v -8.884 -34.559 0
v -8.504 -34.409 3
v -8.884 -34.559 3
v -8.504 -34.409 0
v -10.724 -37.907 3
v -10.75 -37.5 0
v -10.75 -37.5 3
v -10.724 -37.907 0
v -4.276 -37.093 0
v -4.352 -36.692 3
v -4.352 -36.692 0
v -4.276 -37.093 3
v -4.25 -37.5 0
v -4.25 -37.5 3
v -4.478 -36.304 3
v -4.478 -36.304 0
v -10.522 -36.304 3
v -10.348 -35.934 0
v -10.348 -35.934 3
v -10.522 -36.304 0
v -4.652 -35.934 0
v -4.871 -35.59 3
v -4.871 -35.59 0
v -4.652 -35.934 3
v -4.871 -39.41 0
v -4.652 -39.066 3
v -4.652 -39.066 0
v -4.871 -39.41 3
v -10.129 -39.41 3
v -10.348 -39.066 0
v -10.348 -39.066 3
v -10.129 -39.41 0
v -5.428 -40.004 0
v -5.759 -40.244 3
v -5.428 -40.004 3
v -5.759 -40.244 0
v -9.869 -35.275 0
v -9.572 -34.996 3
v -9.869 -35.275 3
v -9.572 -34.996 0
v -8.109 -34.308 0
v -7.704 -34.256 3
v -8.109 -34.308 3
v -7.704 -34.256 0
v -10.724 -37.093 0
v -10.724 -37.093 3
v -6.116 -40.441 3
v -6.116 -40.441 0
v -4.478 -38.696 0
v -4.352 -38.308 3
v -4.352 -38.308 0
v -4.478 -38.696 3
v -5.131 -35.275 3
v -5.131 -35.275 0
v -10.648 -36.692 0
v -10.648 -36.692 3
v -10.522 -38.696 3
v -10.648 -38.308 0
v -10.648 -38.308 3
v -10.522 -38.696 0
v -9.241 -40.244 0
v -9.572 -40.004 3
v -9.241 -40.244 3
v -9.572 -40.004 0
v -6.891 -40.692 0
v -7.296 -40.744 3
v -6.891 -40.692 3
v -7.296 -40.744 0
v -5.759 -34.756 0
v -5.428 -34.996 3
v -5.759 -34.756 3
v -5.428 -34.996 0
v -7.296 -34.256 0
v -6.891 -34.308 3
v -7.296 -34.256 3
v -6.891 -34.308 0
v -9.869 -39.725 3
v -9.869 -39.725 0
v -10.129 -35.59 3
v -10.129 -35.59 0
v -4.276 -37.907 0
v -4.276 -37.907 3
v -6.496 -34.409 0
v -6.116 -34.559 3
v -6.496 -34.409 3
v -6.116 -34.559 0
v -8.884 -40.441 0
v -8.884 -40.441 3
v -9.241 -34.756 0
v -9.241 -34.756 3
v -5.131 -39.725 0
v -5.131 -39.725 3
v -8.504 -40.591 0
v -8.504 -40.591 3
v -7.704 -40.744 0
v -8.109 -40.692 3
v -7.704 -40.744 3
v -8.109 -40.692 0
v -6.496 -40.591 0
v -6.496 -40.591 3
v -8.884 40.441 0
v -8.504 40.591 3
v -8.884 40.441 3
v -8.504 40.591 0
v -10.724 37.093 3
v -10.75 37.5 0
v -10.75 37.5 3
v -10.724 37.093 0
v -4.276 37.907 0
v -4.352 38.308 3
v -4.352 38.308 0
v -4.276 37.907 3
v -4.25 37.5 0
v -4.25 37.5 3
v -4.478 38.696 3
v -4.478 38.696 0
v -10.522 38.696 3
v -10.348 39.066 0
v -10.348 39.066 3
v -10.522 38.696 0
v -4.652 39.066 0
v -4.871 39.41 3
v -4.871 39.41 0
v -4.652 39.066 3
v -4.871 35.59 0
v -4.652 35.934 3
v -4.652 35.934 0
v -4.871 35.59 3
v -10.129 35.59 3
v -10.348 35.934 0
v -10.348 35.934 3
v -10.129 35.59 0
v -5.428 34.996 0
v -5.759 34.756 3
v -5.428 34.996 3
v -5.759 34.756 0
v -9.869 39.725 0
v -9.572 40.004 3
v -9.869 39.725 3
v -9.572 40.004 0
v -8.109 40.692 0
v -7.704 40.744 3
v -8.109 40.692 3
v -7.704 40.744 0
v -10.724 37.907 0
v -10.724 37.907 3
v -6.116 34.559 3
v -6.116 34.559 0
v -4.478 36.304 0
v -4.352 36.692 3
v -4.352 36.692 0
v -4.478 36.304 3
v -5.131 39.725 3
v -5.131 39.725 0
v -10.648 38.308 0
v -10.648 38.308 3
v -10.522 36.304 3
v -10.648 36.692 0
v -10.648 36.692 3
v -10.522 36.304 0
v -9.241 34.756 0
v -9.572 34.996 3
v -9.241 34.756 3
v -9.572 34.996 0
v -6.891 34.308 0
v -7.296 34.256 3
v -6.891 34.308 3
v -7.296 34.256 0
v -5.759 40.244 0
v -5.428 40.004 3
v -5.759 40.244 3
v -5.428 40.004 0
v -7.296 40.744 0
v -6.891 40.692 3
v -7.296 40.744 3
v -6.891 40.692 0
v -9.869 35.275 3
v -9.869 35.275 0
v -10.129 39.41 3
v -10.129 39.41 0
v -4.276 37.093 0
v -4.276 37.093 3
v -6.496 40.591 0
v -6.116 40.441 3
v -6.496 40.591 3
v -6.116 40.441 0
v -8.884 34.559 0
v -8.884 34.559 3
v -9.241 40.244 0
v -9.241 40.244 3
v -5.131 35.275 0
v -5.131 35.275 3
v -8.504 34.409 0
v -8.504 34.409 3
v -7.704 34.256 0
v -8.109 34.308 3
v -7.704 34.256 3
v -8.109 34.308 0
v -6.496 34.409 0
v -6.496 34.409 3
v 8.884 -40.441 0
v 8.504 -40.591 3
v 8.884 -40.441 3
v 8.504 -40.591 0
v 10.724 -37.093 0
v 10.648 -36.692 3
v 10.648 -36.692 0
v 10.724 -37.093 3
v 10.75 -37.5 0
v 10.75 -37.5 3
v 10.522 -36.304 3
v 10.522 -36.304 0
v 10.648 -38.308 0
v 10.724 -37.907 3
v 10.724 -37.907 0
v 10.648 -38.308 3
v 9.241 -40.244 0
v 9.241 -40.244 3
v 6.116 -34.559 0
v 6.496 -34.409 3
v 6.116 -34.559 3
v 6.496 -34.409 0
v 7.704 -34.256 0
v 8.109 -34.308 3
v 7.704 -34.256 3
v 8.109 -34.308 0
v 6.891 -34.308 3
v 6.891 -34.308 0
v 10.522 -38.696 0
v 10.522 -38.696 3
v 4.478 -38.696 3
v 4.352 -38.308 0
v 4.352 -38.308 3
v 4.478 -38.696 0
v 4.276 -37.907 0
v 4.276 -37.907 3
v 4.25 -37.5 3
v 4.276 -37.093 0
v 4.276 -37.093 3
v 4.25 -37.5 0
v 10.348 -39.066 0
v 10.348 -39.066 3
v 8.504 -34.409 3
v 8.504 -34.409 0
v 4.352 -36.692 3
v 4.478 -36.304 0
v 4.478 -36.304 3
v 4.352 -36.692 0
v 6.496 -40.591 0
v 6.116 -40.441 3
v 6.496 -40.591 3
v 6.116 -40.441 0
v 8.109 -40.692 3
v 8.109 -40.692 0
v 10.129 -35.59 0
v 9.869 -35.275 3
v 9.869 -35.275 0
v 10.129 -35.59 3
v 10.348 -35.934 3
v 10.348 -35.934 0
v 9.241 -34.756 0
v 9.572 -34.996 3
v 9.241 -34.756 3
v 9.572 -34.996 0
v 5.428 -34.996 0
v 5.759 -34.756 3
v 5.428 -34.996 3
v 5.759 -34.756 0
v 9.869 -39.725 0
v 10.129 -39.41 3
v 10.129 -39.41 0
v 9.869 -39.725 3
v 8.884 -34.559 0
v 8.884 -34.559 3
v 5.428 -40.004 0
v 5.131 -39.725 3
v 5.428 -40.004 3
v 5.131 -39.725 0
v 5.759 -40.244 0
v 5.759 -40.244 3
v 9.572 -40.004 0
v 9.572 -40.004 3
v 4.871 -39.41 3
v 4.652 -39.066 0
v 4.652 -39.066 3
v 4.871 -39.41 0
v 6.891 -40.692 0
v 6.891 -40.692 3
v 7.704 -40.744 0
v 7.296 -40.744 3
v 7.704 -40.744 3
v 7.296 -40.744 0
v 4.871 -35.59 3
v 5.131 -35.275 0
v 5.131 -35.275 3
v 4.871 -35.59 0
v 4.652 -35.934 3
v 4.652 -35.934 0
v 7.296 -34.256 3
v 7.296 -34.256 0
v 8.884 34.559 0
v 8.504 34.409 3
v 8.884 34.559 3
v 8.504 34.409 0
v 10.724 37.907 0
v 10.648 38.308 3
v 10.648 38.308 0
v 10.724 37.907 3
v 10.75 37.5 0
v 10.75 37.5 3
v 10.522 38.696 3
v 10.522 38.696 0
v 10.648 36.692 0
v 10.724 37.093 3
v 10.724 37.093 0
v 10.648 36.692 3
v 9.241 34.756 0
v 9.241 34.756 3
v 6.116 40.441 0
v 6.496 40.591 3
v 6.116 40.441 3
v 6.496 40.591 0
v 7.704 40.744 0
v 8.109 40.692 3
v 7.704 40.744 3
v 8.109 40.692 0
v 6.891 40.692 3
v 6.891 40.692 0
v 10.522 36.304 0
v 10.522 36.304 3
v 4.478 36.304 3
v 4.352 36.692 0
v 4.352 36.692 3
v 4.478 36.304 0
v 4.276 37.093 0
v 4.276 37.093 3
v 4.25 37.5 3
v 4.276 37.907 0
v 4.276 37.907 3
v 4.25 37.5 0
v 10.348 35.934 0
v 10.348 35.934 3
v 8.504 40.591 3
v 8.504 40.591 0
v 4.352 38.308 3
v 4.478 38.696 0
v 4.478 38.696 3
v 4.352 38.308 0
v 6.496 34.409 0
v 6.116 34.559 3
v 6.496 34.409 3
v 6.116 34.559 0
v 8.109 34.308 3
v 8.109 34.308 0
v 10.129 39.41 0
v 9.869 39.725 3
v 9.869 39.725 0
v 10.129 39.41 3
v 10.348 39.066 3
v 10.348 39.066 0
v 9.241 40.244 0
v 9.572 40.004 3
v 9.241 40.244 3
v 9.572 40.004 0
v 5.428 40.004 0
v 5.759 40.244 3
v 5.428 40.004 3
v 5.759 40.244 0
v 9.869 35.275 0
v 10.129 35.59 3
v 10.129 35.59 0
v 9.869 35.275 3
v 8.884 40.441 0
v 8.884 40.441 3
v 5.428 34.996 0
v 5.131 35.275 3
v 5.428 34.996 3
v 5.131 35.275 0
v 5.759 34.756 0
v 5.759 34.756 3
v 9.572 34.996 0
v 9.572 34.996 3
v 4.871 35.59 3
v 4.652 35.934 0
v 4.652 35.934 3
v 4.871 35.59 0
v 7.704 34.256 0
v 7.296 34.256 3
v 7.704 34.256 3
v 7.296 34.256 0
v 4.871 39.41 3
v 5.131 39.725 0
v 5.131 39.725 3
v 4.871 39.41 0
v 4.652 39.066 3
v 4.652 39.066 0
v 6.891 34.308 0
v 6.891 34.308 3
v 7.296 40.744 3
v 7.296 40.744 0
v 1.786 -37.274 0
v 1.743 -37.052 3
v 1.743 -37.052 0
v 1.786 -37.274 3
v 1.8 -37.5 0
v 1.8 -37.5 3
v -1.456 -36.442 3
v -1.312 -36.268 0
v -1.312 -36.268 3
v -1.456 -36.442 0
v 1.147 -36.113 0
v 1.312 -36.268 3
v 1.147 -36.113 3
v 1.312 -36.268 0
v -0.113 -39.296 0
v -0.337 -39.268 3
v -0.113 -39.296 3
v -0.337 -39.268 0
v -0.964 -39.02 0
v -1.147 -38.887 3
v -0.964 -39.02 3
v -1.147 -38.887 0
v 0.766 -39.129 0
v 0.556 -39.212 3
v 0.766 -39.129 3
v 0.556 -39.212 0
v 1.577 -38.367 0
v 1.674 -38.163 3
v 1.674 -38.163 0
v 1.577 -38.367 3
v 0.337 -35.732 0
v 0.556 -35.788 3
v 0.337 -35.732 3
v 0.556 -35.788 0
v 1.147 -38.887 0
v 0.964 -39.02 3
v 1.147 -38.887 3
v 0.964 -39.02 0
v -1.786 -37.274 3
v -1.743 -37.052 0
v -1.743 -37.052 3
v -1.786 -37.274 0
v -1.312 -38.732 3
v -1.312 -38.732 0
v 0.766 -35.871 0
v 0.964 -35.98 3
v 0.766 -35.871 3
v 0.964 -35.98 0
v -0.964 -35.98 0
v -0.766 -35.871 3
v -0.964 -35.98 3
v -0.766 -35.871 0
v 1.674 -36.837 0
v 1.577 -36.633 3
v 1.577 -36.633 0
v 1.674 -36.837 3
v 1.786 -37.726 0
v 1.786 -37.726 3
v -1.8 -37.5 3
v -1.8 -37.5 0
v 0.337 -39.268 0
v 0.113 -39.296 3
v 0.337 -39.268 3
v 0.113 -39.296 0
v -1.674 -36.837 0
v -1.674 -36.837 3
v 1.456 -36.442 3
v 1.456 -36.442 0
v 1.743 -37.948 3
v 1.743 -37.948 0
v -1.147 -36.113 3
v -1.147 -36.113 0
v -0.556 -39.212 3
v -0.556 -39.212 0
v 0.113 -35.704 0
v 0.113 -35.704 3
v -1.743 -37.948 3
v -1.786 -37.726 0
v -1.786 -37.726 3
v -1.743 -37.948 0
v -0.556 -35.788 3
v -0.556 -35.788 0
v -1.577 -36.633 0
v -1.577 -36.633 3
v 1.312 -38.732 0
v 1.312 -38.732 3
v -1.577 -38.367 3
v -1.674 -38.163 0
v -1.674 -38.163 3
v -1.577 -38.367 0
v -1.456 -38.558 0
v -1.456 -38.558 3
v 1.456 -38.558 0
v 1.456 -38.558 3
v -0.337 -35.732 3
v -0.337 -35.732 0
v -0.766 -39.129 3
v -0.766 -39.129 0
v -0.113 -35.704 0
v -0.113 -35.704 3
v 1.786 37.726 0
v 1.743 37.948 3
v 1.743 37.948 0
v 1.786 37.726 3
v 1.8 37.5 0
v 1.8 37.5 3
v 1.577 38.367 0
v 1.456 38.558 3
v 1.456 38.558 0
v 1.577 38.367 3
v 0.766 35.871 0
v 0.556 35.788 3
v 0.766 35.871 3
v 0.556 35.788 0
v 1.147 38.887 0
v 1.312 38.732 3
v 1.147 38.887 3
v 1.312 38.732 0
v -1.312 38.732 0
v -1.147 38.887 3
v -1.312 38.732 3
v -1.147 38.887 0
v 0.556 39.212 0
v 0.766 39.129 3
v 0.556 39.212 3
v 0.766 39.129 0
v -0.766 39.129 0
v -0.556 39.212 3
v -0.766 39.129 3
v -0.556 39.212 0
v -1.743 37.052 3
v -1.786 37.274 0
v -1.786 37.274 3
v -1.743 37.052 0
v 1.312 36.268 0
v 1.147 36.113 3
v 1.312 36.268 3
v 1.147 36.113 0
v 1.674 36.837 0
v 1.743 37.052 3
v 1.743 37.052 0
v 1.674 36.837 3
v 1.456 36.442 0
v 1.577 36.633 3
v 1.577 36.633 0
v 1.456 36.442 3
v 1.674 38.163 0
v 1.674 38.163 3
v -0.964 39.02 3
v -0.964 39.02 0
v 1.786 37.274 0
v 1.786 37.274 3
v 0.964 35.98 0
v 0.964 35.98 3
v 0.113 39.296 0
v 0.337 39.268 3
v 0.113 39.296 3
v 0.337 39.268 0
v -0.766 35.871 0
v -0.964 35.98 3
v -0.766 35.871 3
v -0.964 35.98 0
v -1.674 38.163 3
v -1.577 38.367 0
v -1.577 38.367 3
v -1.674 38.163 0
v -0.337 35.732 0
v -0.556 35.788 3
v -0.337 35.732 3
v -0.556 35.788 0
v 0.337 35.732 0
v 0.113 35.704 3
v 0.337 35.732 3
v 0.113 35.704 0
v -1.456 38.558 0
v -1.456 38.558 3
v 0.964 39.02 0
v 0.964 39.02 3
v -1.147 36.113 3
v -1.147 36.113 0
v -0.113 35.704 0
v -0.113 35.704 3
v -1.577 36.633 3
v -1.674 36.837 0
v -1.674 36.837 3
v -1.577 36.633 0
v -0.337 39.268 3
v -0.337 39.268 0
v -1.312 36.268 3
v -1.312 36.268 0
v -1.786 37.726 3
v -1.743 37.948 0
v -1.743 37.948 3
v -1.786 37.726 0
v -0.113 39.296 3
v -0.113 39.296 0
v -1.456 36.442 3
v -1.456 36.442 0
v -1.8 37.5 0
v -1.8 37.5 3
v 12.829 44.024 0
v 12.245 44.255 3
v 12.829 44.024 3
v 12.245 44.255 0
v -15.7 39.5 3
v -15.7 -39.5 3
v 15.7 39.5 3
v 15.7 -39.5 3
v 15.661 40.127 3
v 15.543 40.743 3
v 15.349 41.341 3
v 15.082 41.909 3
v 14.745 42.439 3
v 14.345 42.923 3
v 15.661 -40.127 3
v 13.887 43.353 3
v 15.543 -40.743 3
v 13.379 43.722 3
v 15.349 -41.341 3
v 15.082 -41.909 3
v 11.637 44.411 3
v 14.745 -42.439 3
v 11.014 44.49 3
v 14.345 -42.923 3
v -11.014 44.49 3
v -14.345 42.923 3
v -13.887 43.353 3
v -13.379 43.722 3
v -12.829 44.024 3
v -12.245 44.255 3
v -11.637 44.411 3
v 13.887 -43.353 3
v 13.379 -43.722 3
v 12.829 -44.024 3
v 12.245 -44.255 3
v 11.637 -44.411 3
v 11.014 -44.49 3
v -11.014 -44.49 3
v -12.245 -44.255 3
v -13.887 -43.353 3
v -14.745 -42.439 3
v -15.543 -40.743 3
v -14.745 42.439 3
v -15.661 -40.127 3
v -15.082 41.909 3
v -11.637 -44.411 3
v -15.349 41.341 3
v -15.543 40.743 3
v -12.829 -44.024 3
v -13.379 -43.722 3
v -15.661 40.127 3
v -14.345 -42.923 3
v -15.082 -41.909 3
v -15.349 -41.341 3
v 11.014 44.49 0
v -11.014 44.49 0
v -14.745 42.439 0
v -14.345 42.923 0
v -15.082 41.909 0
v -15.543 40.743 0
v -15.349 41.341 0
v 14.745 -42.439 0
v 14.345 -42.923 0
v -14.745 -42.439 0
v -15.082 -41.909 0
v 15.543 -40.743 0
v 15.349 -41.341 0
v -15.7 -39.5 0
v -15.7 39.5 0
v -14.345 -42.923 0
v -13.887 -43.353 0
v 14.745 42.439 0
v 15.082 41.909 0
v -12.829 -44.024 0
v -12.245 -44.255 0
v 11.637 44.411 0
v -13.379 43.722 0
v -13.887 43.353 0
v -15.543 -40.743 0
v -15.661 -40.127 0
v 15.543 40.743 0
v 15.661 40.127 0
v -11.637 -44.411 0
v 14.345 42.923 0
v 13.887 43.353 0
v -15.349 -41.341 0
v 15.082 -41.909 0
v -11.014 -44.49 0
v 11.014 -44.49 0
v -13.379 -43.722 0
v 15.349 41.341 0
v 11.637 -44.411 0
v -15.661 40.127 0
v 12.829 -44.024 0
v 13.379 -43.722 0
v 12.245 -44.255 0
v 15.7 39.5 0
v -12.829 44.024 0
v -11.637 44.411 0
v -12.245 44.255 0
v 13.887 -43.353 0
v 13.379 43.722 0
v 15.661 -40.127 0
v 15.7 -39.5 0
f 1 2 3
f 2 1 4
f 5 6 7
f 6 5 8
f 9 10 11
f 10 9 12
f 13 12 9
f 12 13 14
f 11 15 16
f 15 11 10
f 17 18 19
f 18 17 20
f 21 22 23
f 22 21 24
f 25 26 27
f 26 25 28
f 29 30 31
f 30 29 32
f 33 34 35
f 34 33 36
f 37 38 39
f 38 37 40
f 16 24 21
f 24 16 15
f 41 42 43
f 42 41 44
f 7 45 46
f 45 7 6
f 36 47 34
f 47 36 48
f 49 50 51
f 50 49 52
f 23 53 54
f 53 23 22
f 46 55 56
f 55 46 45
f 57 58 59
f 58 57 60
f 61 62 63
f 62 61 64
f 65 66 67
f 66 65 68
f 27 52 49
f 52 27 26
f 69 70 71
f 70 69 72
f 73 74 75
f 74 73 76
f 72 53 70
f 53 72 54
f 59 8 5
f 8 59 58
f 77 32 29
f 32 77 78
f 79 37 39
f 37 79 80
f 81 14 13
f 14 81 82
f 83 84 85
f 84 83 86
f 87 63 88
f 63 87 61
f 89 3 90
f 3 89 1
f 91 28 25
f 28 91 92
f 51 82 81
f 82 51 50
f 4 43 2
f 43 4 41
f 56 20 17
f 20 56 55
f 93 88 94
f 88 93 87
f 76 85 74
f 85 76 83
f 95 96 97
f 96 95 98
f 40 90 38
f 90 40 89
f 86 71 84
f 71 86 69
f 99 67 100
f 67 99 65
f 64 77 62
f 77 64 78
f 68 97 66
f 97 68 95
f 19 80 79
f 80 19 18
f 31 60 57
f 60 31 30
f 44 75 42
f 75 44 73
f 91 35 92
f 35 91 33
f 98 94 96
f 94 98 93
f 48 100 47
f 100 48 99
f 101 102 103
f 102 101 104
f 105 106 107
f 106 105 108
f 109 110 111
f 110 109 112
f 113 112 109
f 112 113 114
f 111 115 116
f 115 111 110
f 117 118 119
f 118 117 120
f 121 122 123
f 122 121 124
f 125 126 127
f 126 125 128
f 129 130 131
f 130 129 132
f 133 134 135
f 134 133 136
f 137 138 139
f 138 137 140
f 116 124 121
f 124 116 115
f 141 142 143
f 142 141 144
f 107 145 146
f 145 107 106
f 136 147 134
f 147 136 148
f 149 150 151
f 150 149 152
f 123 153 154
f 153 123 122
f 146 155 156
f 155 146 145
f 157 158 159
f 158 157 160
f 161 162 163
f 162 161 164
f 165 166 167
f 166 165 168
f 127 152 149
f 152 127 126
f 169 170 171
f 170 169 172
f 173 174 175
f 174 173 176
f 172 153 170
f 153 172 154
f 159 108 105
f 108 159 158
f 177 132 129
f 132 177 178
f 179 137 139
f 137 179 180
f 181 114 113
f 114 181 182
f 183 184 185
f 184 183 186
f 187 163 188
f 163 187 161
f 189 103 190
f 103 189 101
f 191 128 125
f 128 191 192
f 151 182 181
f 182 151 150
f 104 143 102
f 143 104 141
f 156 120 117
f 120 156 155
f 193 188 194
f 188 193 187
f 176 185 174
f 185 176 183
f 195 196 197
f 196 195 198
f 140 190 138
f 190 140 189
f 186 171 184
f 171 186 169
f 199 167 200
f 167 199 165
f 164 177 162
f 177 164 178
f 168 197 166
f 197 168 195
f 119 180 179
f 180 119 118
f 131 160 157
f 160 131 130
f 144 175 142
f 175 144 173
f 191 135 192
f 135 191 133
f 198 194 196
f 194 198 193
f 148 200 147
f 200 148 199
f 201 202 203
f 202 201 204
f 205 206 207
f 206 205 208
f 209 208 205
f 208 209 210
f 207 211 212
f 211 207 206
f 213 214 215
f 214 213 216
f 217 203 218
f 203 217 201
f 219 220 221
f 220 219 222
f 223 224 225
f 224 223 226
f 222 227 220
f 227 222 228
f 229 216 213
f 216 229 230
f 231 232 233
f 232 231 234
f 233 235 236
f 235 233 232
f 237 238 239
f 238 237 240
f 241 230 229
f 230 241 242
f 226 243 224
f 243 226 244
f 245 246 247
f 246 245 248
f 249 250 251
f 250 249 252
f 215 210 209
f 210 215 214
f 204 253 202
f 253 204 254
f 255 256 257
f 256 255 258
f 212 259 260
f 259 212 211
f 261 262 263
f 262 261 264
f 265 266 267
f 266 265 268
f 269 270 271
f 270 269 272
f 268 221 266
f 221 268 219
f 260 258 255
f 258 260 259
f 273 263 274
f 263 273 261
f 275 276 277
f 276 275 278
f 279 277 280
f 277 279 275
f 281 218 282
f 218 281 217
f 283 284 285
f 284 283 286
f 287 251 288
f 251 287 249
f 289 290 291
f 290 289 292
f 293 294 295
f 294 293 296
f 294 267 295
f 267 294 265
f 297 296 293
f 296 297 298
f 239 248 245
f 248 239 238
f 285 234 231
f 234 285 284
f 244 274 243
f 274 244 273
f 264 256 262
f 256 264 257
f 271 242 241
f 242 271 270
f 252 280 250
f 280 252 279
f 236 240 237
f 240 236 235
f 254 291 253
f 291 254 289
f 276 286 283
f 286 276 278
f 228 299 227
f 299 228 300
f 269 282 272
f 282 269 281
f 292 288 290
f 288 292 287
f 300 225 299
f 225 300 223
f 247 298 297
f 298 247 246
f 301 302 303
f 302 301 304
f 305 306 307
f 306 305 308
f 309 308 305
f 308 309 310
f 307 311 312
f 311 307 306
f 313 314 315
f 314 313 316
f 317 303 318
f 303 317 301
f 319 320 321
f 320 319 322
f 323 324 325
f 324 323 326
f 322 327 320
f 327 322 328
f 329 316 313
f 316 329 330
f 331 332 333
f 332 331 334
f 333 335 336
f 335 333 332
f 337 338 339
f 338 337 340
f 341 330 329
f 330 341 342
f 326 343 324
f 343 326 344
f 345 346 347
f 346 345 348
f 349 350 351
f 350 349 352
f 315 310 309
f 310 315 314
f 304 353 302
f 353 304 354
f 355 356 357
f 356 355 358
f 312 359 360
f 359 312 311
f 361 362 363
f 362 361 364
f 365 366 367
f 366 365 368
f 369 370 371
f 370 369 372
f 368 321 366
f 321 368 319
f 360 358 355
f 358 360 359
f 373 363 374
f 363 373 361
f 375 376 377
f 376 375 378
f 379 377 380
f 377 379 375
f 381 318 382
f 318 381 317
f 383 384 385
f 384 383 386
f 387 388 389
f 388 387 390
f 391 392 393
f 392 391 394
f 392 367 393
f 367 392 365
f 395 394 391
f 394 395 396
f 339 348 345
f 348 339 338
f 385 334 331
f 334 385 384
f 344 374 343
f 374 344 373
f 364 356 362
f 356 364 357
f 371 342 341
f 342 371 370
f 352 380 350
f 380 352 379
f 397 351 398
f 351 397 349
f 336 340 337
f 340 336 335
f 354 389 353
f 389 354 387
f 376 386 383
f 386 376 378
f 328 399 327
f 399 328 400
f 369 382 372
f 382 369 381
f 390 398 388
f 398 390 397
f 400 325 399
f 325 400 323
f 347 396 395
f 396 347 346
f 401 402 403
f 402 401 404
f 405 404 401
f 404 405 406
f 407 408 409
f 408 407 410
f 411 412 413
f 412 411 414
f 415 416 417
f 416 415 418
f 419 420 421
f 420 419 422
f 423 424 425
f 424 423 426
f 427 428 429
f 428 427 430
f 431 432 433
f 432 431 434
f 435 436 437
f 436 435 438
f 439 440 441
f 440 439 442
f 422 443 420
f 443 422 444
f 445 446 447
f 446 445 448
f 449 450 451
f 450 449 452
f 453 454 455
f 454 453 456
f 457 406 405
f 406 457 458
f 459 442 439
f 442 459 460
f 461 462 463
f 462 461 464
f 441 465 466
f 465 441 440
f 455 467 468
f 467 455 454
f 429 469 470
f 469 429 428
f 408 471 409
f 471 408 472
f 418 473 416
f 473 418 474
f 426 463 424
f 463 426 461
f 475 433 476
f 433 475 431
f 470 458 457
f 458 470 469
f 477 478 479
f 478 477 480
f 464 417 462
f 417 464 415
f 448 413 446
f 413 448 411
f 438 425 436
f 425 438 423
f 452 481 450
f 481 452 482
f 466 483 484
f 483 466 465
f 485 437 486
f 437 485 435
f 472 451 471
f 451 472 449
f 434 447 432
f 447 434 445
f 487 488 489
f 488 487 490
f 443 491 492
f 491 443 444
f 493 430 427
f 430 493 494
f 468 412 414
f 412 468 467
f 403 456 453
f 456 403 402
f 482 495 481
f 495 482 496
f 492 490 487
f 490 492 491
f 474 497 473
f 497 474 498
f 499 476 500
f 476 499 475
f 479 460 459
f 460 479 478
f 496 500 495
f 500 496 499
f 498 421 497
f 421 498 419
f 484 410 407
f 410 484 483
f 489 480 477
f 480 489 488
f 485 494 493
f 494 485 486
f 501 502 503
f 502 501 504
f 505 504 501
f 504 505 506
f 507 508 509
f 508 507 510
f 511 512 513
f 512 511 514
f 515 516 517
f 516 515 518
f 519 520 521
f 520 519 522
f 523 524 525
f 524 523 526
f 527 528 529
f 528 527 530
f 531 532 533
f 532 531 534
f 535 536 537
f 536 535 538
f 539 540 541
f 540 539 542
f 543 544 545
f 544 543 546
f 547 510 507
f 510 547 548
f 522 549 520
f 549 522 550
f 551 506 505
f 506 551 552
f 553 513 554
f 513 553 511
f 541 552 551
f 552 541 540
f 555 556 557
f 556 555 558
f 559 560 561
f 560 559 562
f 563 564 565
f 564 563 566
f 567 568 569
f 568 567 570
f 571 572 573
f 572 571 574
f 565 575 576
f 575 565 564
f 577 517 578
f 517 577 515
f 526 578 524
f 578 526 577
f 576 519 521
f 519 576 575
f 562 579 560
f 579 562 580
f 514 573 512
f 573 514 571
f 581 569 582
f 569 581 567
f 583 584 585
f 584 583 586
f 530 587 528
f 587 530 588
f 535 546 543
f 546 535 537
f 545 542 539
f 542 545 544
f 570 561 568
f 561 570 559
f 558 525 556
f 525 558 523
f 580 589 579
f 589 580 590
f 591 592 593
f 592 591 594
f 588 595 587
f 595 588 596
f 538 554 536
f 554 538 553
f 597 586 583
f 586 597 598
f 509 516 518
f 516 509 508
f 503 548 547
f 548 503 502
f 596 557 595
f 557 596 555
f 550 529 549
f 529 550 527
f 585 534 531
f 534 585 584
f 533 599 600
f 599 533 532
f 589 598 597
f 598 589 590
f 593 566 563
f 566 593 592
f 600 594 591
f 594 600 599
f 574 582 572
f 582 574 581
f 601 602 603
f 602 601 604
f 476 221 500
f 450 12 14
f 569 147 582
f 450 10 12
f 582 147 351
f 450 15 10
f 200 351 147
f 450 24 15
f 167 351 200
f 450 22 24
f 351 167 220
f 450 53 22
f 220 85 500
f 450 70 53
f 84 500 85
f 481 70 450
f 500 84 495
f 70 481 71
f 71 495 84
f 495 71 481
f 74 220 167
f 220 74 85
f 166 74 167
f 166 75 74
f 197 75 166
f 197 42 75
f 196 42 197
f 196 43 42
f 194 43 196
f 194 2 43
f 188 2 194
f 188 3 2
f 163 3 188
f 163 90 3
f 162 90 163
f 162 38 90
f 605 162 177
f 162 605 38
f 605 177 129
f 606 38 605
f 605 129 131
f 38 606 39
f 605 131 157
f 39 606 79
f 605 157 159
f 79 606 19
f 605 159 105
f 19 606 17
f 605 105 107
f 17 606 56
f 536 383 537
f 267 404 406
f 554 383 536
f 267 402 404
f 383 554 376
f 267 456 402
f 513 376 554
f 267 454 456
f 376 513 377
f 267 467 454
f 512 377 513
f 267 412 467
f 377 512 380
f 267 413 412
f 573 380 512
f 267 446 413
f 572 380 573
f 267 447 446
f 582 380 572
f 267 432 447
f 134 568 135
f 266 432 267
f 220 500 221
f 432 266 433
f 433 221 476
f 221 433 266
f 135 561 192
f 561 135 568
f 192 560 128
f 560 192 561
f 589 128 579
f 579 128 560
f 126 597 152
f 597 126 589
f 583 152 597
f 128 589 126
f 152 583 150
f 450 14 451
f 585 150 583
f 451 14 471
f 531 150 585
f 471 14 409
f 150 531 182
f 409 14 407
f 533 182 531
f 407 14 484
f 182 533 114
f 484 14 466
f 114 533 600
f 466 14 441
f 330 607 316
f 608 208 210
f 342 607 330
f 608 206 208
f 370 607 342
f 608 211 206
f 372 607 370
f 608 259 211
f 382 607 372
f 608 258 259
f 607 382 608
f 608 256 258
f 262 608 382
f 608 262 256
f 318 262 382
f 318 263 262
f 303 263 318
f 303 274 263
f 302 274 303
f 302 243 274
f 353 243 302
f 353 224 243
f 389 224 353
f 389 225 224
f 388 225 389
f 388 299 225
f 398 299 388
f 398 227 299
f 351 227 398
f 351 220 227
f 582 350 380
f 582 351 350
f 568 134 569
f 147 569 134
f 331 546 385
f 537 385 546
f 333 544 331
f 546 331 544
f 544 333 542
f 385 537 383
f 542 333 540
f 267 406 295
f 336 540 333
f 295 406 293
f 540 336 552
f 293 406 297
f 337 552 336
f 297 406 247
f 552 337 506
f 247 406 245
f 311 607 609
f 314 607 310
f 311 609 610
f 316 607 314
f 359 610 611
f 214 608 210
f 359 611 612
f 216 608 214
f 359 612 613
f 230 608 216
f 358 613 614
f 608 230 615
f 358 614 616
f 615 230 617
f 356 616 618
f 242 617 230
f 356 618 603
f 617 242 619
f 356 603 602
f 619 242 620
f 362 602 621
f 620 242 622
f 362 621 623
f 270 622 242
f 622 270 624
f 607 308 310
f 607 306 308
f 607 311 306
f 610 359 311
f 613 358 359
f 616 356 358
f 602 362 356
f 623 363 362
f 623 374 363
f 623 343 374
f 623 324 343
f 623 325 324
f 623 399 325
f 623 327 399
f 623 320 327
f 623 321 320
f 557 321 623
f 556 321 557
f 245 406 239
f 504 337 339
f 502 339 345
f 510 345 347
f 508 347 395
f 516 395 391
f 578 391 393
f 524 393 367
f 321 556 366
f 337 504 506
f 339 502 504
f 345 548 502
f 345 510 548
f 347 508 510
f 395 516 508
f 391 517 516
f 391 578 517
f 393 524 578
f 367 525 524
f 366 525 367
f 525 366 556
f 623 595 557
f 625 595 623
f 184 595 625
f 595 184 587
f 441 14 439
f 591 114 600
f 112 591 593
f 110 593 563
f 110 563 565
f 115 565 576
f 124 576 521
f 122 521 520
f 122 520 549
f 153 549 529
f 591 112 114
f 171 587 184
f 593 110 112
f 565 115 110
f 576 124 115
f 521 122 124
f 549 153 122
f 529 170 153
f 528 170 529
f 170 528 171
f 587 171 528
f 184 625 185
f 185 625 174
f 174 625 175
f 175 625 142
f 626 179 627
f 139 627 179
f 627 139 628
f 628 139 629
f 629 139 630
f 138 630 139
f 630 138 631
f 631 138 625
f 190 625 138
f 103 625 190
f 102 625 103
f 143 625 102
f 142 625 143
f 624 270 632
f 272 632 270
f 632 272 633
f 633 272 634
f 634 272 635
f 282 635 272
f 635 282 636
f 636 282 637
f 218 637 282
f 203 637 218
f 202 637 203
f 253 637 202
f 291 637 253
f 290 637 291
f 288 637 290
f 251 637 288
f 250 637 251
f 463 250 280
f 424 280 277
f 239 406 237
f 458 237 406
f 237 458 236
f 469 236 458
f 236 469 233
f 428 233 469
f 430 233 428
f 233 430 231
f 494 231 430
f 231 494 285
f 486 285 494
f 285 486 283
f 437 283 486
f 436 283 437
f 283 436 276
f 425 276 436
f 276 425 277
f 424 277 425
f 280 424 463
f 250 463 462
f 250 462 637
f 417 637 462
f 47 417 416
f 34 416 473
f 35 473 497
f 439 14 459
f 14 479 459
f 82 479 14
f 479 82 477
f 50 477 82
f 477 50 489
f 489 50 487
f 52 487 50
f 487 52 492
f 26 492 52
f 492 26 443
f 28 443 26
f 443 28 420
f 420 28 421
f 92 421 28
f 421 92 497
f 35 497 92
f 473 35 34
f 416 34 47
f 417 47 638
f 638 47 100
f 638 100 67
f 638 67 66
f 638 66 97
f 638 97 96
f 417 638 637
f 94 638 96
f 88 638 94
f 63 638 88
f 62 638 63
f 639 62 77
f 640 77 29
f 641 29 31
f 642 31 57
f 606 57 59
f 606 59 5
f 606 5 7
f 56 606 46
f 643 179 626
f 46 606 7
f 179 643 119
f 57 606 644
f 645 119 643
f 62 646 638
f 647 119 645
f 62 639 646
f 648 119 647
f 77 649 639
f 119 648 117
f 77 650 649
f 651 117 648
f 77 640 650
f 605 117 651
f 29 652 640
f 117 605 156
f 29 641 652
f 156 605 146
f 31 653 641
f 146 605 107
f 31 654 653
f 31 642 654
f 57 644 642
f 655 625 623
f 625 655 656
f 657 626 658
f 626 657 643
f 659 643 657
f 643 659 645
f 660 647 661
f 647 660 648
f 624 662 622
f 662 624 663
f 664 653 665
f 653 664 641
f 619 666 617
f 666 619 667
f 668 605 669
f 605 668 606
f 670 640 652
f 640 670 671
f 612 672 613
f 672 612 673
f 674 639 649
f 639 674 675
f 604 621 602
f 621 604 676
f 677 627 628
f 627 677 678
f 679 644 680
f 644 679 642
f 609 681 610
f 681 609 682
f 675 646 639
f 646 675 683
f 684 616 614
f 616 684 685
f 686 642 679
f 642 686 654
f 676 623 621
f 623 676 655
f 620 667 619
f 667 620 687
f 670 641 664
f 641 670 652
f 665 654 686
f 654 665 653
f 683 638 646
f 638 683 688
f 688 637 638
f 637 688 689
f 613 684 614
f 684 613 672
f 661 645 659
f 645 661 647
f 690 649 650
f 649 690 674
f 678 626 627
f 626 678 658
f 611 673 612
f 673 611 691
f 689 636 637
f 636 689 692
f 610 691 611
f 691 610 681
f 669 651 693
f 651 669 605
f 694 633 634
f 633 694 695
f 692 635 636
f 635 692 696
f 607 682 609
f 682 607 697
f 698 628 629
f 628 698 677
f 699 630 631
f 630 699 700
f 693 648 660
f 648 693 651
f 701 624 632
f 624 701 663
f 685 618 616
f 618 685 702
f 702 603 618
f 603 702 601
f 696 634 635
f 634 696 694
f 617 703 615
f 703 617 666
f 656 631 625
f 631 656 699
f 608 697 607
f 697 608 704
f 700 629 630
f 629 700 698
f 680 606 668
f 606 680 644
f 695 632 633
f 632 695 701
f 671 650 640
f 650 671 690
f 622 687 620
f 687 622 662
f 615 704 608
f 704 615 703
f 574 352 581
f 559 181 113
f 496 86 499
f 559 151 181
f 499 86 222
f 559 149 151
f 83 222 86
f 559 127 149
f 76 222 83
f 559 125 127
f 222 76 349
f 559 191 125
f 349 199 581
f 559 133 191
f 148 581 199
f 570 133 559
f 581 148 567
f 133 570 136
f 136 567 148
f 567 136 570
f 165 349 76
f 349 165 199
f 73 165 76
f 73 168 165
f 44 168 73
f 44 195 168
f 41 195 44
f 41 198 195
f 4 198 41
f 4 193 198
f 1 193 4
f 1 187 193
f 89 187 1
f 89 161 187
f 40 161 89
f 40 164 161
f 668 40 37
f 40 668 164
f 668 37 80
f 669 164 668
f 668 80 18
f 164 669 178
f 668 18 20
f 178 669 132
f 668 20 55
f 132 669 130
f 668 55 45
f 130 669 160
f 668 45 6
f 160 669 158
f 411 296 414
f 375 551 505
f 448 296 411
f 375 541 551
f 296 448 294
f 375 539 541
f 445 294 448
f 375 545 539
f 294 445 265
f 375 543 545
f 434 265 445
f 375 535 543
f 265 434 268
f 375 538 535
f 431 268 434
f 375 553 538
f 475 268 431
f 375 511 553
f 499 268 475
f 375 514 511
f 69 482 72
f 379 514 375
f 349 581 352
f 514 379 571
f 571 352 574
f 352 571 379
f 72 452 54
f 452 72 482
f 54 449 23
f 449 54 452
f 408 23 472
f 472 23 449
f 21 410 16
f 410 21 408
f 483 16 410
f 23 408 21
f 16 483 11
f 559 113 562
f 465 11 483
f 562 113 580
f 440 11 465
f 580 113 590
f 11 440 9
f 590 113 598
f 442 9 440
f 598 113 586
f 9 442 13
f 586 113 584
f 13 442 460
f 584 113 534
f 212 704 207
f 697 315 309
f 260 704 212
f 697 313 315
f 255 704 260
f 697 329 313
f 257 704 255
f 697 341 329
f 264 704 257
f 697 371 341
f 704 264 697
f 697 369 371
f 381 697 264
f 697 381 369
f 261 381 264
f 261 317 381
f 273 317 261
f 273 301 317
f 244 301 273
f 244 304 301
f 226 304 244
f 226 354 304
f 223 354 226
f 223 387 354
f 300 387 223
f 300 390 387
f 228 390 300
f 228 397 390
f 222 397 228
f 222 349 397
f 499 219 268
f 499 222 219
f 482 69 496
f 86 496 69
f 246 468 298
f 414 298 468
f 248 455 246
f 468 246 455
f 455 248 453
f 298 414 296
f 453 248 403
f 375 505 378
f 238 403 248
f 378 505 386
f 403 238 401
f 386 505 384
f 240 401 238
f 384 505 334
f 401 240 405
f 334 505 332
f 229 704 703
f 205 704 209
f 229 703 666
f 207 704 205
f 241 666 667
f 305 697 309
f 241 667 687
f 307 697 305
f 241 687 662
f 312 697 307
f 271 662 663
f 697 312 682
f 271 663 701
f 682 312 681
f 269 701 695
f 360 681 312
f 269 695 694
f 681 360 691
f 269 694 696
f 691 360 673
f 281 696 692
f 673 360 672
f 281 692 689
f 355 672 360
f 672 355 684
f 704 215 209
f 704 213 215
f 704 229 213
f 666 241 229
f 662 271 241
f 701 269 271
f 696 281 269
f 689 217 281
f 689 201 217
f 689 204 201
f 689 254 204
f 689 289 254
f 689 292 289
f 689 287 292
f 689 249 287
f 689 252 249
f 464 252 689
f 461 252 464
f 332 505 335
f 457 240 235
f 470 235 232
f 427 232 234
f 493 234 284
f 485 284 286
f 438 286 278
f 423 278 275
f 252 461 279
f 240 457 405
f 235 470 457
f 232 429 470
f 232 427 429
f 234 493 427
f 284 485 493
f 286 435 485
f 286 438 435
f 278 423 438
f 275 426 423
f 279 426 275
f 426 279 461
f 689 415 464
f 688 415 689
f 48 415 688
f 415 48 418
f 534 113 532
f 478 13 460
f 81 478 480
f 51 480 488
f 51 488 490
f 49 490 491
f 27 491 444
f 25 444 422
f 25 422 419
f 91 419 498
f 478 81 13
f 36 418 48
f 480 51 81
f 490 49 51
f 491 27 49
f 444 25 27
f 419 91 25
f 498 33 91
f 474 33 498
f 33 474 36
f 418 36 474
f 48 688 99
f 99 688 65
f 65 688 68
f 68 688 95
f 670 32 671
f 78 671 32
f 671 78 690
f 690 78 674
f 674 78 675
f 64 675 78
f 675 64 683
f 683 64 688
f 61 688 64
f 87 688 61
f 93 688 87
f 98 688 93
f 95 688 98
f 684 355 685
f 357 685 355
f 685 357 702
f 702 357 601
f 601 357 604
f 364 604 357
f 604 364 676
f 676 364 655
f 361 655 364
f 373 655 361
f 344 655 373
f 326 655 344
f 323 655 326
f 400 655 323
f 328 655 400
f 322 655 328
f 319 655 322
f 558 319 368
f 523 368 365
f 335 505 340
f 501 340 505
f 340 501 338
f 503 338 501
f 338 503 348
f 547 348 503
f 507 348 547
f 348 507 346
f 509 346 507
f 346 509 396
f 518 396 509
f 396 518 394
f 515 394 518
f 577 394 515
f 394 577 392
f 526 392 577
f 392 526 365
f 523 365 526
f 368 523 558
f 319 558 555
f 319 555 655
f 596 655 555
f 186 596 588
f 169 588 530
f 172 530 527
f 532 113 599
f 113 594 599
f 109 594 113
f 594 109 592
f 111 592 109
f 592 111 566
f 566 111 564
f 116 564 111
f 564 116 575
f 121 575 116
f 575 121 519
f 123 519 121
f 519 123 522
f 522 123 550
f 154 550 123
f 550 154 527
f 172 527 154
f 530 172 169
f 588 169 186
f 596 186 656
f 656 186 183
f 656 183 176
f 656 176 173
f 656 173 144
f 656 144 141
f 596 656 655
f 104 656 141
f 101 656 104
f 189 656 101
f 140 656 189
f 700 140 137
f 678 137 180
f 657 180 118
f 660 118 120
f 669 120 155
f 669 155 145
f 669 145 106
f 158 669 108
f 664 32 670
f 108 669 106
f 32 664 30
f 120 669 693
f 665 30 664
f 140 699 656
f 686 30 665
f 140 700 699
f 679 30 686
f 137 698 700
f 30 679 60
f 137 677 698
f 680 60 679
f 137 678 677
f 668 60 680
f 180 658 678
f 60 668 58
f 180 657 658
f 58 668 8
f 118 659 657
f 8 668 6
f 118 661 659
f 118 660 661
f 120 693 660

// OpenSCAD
$fn = 50;

difference() {
	union() {
		hull() {
			translate(v = [-10.7, 39.5, 0]) {
				cylinder(h = 3, r = 5);
			}
			translate(v = [10.7, 39.5, 0]) {
				cylinder(h = 3, r = 5);
			}
			translate(v = [-10.7, -39.5, 0]) {
				cylinder(h = 3, r = 5);
			}
			translate(v = [10.7, -39.5, 0]) {
				cylinder(h = 3, r = 5);
			}
		}
	}
	union() {
		translate(v = [-7.5, -37.5, -1]) {
			cylinder(h = 5, r = 3.25);
		}
		translate(v = [-7.5, 37.5, -1]) {
			cylinder(h = 5, r = 3.25);
		}
		translate(v = [7.5, -37.5, -1]) {
			cylinder(h = 5, r = 3.25);
		}
		translate(v = [7.5, 37.5, -1]) {
			cylinder(h = 5, r = 3.25);
		}
		translate(v = [0.0, -37.5, -1]) {
			cylinder(h = 5, r = 1.8);
		}
		translate(v = [0.0, 37.5, -1]) {
			cylinder(h = 5, r = 1.8);
		}
	}
}
